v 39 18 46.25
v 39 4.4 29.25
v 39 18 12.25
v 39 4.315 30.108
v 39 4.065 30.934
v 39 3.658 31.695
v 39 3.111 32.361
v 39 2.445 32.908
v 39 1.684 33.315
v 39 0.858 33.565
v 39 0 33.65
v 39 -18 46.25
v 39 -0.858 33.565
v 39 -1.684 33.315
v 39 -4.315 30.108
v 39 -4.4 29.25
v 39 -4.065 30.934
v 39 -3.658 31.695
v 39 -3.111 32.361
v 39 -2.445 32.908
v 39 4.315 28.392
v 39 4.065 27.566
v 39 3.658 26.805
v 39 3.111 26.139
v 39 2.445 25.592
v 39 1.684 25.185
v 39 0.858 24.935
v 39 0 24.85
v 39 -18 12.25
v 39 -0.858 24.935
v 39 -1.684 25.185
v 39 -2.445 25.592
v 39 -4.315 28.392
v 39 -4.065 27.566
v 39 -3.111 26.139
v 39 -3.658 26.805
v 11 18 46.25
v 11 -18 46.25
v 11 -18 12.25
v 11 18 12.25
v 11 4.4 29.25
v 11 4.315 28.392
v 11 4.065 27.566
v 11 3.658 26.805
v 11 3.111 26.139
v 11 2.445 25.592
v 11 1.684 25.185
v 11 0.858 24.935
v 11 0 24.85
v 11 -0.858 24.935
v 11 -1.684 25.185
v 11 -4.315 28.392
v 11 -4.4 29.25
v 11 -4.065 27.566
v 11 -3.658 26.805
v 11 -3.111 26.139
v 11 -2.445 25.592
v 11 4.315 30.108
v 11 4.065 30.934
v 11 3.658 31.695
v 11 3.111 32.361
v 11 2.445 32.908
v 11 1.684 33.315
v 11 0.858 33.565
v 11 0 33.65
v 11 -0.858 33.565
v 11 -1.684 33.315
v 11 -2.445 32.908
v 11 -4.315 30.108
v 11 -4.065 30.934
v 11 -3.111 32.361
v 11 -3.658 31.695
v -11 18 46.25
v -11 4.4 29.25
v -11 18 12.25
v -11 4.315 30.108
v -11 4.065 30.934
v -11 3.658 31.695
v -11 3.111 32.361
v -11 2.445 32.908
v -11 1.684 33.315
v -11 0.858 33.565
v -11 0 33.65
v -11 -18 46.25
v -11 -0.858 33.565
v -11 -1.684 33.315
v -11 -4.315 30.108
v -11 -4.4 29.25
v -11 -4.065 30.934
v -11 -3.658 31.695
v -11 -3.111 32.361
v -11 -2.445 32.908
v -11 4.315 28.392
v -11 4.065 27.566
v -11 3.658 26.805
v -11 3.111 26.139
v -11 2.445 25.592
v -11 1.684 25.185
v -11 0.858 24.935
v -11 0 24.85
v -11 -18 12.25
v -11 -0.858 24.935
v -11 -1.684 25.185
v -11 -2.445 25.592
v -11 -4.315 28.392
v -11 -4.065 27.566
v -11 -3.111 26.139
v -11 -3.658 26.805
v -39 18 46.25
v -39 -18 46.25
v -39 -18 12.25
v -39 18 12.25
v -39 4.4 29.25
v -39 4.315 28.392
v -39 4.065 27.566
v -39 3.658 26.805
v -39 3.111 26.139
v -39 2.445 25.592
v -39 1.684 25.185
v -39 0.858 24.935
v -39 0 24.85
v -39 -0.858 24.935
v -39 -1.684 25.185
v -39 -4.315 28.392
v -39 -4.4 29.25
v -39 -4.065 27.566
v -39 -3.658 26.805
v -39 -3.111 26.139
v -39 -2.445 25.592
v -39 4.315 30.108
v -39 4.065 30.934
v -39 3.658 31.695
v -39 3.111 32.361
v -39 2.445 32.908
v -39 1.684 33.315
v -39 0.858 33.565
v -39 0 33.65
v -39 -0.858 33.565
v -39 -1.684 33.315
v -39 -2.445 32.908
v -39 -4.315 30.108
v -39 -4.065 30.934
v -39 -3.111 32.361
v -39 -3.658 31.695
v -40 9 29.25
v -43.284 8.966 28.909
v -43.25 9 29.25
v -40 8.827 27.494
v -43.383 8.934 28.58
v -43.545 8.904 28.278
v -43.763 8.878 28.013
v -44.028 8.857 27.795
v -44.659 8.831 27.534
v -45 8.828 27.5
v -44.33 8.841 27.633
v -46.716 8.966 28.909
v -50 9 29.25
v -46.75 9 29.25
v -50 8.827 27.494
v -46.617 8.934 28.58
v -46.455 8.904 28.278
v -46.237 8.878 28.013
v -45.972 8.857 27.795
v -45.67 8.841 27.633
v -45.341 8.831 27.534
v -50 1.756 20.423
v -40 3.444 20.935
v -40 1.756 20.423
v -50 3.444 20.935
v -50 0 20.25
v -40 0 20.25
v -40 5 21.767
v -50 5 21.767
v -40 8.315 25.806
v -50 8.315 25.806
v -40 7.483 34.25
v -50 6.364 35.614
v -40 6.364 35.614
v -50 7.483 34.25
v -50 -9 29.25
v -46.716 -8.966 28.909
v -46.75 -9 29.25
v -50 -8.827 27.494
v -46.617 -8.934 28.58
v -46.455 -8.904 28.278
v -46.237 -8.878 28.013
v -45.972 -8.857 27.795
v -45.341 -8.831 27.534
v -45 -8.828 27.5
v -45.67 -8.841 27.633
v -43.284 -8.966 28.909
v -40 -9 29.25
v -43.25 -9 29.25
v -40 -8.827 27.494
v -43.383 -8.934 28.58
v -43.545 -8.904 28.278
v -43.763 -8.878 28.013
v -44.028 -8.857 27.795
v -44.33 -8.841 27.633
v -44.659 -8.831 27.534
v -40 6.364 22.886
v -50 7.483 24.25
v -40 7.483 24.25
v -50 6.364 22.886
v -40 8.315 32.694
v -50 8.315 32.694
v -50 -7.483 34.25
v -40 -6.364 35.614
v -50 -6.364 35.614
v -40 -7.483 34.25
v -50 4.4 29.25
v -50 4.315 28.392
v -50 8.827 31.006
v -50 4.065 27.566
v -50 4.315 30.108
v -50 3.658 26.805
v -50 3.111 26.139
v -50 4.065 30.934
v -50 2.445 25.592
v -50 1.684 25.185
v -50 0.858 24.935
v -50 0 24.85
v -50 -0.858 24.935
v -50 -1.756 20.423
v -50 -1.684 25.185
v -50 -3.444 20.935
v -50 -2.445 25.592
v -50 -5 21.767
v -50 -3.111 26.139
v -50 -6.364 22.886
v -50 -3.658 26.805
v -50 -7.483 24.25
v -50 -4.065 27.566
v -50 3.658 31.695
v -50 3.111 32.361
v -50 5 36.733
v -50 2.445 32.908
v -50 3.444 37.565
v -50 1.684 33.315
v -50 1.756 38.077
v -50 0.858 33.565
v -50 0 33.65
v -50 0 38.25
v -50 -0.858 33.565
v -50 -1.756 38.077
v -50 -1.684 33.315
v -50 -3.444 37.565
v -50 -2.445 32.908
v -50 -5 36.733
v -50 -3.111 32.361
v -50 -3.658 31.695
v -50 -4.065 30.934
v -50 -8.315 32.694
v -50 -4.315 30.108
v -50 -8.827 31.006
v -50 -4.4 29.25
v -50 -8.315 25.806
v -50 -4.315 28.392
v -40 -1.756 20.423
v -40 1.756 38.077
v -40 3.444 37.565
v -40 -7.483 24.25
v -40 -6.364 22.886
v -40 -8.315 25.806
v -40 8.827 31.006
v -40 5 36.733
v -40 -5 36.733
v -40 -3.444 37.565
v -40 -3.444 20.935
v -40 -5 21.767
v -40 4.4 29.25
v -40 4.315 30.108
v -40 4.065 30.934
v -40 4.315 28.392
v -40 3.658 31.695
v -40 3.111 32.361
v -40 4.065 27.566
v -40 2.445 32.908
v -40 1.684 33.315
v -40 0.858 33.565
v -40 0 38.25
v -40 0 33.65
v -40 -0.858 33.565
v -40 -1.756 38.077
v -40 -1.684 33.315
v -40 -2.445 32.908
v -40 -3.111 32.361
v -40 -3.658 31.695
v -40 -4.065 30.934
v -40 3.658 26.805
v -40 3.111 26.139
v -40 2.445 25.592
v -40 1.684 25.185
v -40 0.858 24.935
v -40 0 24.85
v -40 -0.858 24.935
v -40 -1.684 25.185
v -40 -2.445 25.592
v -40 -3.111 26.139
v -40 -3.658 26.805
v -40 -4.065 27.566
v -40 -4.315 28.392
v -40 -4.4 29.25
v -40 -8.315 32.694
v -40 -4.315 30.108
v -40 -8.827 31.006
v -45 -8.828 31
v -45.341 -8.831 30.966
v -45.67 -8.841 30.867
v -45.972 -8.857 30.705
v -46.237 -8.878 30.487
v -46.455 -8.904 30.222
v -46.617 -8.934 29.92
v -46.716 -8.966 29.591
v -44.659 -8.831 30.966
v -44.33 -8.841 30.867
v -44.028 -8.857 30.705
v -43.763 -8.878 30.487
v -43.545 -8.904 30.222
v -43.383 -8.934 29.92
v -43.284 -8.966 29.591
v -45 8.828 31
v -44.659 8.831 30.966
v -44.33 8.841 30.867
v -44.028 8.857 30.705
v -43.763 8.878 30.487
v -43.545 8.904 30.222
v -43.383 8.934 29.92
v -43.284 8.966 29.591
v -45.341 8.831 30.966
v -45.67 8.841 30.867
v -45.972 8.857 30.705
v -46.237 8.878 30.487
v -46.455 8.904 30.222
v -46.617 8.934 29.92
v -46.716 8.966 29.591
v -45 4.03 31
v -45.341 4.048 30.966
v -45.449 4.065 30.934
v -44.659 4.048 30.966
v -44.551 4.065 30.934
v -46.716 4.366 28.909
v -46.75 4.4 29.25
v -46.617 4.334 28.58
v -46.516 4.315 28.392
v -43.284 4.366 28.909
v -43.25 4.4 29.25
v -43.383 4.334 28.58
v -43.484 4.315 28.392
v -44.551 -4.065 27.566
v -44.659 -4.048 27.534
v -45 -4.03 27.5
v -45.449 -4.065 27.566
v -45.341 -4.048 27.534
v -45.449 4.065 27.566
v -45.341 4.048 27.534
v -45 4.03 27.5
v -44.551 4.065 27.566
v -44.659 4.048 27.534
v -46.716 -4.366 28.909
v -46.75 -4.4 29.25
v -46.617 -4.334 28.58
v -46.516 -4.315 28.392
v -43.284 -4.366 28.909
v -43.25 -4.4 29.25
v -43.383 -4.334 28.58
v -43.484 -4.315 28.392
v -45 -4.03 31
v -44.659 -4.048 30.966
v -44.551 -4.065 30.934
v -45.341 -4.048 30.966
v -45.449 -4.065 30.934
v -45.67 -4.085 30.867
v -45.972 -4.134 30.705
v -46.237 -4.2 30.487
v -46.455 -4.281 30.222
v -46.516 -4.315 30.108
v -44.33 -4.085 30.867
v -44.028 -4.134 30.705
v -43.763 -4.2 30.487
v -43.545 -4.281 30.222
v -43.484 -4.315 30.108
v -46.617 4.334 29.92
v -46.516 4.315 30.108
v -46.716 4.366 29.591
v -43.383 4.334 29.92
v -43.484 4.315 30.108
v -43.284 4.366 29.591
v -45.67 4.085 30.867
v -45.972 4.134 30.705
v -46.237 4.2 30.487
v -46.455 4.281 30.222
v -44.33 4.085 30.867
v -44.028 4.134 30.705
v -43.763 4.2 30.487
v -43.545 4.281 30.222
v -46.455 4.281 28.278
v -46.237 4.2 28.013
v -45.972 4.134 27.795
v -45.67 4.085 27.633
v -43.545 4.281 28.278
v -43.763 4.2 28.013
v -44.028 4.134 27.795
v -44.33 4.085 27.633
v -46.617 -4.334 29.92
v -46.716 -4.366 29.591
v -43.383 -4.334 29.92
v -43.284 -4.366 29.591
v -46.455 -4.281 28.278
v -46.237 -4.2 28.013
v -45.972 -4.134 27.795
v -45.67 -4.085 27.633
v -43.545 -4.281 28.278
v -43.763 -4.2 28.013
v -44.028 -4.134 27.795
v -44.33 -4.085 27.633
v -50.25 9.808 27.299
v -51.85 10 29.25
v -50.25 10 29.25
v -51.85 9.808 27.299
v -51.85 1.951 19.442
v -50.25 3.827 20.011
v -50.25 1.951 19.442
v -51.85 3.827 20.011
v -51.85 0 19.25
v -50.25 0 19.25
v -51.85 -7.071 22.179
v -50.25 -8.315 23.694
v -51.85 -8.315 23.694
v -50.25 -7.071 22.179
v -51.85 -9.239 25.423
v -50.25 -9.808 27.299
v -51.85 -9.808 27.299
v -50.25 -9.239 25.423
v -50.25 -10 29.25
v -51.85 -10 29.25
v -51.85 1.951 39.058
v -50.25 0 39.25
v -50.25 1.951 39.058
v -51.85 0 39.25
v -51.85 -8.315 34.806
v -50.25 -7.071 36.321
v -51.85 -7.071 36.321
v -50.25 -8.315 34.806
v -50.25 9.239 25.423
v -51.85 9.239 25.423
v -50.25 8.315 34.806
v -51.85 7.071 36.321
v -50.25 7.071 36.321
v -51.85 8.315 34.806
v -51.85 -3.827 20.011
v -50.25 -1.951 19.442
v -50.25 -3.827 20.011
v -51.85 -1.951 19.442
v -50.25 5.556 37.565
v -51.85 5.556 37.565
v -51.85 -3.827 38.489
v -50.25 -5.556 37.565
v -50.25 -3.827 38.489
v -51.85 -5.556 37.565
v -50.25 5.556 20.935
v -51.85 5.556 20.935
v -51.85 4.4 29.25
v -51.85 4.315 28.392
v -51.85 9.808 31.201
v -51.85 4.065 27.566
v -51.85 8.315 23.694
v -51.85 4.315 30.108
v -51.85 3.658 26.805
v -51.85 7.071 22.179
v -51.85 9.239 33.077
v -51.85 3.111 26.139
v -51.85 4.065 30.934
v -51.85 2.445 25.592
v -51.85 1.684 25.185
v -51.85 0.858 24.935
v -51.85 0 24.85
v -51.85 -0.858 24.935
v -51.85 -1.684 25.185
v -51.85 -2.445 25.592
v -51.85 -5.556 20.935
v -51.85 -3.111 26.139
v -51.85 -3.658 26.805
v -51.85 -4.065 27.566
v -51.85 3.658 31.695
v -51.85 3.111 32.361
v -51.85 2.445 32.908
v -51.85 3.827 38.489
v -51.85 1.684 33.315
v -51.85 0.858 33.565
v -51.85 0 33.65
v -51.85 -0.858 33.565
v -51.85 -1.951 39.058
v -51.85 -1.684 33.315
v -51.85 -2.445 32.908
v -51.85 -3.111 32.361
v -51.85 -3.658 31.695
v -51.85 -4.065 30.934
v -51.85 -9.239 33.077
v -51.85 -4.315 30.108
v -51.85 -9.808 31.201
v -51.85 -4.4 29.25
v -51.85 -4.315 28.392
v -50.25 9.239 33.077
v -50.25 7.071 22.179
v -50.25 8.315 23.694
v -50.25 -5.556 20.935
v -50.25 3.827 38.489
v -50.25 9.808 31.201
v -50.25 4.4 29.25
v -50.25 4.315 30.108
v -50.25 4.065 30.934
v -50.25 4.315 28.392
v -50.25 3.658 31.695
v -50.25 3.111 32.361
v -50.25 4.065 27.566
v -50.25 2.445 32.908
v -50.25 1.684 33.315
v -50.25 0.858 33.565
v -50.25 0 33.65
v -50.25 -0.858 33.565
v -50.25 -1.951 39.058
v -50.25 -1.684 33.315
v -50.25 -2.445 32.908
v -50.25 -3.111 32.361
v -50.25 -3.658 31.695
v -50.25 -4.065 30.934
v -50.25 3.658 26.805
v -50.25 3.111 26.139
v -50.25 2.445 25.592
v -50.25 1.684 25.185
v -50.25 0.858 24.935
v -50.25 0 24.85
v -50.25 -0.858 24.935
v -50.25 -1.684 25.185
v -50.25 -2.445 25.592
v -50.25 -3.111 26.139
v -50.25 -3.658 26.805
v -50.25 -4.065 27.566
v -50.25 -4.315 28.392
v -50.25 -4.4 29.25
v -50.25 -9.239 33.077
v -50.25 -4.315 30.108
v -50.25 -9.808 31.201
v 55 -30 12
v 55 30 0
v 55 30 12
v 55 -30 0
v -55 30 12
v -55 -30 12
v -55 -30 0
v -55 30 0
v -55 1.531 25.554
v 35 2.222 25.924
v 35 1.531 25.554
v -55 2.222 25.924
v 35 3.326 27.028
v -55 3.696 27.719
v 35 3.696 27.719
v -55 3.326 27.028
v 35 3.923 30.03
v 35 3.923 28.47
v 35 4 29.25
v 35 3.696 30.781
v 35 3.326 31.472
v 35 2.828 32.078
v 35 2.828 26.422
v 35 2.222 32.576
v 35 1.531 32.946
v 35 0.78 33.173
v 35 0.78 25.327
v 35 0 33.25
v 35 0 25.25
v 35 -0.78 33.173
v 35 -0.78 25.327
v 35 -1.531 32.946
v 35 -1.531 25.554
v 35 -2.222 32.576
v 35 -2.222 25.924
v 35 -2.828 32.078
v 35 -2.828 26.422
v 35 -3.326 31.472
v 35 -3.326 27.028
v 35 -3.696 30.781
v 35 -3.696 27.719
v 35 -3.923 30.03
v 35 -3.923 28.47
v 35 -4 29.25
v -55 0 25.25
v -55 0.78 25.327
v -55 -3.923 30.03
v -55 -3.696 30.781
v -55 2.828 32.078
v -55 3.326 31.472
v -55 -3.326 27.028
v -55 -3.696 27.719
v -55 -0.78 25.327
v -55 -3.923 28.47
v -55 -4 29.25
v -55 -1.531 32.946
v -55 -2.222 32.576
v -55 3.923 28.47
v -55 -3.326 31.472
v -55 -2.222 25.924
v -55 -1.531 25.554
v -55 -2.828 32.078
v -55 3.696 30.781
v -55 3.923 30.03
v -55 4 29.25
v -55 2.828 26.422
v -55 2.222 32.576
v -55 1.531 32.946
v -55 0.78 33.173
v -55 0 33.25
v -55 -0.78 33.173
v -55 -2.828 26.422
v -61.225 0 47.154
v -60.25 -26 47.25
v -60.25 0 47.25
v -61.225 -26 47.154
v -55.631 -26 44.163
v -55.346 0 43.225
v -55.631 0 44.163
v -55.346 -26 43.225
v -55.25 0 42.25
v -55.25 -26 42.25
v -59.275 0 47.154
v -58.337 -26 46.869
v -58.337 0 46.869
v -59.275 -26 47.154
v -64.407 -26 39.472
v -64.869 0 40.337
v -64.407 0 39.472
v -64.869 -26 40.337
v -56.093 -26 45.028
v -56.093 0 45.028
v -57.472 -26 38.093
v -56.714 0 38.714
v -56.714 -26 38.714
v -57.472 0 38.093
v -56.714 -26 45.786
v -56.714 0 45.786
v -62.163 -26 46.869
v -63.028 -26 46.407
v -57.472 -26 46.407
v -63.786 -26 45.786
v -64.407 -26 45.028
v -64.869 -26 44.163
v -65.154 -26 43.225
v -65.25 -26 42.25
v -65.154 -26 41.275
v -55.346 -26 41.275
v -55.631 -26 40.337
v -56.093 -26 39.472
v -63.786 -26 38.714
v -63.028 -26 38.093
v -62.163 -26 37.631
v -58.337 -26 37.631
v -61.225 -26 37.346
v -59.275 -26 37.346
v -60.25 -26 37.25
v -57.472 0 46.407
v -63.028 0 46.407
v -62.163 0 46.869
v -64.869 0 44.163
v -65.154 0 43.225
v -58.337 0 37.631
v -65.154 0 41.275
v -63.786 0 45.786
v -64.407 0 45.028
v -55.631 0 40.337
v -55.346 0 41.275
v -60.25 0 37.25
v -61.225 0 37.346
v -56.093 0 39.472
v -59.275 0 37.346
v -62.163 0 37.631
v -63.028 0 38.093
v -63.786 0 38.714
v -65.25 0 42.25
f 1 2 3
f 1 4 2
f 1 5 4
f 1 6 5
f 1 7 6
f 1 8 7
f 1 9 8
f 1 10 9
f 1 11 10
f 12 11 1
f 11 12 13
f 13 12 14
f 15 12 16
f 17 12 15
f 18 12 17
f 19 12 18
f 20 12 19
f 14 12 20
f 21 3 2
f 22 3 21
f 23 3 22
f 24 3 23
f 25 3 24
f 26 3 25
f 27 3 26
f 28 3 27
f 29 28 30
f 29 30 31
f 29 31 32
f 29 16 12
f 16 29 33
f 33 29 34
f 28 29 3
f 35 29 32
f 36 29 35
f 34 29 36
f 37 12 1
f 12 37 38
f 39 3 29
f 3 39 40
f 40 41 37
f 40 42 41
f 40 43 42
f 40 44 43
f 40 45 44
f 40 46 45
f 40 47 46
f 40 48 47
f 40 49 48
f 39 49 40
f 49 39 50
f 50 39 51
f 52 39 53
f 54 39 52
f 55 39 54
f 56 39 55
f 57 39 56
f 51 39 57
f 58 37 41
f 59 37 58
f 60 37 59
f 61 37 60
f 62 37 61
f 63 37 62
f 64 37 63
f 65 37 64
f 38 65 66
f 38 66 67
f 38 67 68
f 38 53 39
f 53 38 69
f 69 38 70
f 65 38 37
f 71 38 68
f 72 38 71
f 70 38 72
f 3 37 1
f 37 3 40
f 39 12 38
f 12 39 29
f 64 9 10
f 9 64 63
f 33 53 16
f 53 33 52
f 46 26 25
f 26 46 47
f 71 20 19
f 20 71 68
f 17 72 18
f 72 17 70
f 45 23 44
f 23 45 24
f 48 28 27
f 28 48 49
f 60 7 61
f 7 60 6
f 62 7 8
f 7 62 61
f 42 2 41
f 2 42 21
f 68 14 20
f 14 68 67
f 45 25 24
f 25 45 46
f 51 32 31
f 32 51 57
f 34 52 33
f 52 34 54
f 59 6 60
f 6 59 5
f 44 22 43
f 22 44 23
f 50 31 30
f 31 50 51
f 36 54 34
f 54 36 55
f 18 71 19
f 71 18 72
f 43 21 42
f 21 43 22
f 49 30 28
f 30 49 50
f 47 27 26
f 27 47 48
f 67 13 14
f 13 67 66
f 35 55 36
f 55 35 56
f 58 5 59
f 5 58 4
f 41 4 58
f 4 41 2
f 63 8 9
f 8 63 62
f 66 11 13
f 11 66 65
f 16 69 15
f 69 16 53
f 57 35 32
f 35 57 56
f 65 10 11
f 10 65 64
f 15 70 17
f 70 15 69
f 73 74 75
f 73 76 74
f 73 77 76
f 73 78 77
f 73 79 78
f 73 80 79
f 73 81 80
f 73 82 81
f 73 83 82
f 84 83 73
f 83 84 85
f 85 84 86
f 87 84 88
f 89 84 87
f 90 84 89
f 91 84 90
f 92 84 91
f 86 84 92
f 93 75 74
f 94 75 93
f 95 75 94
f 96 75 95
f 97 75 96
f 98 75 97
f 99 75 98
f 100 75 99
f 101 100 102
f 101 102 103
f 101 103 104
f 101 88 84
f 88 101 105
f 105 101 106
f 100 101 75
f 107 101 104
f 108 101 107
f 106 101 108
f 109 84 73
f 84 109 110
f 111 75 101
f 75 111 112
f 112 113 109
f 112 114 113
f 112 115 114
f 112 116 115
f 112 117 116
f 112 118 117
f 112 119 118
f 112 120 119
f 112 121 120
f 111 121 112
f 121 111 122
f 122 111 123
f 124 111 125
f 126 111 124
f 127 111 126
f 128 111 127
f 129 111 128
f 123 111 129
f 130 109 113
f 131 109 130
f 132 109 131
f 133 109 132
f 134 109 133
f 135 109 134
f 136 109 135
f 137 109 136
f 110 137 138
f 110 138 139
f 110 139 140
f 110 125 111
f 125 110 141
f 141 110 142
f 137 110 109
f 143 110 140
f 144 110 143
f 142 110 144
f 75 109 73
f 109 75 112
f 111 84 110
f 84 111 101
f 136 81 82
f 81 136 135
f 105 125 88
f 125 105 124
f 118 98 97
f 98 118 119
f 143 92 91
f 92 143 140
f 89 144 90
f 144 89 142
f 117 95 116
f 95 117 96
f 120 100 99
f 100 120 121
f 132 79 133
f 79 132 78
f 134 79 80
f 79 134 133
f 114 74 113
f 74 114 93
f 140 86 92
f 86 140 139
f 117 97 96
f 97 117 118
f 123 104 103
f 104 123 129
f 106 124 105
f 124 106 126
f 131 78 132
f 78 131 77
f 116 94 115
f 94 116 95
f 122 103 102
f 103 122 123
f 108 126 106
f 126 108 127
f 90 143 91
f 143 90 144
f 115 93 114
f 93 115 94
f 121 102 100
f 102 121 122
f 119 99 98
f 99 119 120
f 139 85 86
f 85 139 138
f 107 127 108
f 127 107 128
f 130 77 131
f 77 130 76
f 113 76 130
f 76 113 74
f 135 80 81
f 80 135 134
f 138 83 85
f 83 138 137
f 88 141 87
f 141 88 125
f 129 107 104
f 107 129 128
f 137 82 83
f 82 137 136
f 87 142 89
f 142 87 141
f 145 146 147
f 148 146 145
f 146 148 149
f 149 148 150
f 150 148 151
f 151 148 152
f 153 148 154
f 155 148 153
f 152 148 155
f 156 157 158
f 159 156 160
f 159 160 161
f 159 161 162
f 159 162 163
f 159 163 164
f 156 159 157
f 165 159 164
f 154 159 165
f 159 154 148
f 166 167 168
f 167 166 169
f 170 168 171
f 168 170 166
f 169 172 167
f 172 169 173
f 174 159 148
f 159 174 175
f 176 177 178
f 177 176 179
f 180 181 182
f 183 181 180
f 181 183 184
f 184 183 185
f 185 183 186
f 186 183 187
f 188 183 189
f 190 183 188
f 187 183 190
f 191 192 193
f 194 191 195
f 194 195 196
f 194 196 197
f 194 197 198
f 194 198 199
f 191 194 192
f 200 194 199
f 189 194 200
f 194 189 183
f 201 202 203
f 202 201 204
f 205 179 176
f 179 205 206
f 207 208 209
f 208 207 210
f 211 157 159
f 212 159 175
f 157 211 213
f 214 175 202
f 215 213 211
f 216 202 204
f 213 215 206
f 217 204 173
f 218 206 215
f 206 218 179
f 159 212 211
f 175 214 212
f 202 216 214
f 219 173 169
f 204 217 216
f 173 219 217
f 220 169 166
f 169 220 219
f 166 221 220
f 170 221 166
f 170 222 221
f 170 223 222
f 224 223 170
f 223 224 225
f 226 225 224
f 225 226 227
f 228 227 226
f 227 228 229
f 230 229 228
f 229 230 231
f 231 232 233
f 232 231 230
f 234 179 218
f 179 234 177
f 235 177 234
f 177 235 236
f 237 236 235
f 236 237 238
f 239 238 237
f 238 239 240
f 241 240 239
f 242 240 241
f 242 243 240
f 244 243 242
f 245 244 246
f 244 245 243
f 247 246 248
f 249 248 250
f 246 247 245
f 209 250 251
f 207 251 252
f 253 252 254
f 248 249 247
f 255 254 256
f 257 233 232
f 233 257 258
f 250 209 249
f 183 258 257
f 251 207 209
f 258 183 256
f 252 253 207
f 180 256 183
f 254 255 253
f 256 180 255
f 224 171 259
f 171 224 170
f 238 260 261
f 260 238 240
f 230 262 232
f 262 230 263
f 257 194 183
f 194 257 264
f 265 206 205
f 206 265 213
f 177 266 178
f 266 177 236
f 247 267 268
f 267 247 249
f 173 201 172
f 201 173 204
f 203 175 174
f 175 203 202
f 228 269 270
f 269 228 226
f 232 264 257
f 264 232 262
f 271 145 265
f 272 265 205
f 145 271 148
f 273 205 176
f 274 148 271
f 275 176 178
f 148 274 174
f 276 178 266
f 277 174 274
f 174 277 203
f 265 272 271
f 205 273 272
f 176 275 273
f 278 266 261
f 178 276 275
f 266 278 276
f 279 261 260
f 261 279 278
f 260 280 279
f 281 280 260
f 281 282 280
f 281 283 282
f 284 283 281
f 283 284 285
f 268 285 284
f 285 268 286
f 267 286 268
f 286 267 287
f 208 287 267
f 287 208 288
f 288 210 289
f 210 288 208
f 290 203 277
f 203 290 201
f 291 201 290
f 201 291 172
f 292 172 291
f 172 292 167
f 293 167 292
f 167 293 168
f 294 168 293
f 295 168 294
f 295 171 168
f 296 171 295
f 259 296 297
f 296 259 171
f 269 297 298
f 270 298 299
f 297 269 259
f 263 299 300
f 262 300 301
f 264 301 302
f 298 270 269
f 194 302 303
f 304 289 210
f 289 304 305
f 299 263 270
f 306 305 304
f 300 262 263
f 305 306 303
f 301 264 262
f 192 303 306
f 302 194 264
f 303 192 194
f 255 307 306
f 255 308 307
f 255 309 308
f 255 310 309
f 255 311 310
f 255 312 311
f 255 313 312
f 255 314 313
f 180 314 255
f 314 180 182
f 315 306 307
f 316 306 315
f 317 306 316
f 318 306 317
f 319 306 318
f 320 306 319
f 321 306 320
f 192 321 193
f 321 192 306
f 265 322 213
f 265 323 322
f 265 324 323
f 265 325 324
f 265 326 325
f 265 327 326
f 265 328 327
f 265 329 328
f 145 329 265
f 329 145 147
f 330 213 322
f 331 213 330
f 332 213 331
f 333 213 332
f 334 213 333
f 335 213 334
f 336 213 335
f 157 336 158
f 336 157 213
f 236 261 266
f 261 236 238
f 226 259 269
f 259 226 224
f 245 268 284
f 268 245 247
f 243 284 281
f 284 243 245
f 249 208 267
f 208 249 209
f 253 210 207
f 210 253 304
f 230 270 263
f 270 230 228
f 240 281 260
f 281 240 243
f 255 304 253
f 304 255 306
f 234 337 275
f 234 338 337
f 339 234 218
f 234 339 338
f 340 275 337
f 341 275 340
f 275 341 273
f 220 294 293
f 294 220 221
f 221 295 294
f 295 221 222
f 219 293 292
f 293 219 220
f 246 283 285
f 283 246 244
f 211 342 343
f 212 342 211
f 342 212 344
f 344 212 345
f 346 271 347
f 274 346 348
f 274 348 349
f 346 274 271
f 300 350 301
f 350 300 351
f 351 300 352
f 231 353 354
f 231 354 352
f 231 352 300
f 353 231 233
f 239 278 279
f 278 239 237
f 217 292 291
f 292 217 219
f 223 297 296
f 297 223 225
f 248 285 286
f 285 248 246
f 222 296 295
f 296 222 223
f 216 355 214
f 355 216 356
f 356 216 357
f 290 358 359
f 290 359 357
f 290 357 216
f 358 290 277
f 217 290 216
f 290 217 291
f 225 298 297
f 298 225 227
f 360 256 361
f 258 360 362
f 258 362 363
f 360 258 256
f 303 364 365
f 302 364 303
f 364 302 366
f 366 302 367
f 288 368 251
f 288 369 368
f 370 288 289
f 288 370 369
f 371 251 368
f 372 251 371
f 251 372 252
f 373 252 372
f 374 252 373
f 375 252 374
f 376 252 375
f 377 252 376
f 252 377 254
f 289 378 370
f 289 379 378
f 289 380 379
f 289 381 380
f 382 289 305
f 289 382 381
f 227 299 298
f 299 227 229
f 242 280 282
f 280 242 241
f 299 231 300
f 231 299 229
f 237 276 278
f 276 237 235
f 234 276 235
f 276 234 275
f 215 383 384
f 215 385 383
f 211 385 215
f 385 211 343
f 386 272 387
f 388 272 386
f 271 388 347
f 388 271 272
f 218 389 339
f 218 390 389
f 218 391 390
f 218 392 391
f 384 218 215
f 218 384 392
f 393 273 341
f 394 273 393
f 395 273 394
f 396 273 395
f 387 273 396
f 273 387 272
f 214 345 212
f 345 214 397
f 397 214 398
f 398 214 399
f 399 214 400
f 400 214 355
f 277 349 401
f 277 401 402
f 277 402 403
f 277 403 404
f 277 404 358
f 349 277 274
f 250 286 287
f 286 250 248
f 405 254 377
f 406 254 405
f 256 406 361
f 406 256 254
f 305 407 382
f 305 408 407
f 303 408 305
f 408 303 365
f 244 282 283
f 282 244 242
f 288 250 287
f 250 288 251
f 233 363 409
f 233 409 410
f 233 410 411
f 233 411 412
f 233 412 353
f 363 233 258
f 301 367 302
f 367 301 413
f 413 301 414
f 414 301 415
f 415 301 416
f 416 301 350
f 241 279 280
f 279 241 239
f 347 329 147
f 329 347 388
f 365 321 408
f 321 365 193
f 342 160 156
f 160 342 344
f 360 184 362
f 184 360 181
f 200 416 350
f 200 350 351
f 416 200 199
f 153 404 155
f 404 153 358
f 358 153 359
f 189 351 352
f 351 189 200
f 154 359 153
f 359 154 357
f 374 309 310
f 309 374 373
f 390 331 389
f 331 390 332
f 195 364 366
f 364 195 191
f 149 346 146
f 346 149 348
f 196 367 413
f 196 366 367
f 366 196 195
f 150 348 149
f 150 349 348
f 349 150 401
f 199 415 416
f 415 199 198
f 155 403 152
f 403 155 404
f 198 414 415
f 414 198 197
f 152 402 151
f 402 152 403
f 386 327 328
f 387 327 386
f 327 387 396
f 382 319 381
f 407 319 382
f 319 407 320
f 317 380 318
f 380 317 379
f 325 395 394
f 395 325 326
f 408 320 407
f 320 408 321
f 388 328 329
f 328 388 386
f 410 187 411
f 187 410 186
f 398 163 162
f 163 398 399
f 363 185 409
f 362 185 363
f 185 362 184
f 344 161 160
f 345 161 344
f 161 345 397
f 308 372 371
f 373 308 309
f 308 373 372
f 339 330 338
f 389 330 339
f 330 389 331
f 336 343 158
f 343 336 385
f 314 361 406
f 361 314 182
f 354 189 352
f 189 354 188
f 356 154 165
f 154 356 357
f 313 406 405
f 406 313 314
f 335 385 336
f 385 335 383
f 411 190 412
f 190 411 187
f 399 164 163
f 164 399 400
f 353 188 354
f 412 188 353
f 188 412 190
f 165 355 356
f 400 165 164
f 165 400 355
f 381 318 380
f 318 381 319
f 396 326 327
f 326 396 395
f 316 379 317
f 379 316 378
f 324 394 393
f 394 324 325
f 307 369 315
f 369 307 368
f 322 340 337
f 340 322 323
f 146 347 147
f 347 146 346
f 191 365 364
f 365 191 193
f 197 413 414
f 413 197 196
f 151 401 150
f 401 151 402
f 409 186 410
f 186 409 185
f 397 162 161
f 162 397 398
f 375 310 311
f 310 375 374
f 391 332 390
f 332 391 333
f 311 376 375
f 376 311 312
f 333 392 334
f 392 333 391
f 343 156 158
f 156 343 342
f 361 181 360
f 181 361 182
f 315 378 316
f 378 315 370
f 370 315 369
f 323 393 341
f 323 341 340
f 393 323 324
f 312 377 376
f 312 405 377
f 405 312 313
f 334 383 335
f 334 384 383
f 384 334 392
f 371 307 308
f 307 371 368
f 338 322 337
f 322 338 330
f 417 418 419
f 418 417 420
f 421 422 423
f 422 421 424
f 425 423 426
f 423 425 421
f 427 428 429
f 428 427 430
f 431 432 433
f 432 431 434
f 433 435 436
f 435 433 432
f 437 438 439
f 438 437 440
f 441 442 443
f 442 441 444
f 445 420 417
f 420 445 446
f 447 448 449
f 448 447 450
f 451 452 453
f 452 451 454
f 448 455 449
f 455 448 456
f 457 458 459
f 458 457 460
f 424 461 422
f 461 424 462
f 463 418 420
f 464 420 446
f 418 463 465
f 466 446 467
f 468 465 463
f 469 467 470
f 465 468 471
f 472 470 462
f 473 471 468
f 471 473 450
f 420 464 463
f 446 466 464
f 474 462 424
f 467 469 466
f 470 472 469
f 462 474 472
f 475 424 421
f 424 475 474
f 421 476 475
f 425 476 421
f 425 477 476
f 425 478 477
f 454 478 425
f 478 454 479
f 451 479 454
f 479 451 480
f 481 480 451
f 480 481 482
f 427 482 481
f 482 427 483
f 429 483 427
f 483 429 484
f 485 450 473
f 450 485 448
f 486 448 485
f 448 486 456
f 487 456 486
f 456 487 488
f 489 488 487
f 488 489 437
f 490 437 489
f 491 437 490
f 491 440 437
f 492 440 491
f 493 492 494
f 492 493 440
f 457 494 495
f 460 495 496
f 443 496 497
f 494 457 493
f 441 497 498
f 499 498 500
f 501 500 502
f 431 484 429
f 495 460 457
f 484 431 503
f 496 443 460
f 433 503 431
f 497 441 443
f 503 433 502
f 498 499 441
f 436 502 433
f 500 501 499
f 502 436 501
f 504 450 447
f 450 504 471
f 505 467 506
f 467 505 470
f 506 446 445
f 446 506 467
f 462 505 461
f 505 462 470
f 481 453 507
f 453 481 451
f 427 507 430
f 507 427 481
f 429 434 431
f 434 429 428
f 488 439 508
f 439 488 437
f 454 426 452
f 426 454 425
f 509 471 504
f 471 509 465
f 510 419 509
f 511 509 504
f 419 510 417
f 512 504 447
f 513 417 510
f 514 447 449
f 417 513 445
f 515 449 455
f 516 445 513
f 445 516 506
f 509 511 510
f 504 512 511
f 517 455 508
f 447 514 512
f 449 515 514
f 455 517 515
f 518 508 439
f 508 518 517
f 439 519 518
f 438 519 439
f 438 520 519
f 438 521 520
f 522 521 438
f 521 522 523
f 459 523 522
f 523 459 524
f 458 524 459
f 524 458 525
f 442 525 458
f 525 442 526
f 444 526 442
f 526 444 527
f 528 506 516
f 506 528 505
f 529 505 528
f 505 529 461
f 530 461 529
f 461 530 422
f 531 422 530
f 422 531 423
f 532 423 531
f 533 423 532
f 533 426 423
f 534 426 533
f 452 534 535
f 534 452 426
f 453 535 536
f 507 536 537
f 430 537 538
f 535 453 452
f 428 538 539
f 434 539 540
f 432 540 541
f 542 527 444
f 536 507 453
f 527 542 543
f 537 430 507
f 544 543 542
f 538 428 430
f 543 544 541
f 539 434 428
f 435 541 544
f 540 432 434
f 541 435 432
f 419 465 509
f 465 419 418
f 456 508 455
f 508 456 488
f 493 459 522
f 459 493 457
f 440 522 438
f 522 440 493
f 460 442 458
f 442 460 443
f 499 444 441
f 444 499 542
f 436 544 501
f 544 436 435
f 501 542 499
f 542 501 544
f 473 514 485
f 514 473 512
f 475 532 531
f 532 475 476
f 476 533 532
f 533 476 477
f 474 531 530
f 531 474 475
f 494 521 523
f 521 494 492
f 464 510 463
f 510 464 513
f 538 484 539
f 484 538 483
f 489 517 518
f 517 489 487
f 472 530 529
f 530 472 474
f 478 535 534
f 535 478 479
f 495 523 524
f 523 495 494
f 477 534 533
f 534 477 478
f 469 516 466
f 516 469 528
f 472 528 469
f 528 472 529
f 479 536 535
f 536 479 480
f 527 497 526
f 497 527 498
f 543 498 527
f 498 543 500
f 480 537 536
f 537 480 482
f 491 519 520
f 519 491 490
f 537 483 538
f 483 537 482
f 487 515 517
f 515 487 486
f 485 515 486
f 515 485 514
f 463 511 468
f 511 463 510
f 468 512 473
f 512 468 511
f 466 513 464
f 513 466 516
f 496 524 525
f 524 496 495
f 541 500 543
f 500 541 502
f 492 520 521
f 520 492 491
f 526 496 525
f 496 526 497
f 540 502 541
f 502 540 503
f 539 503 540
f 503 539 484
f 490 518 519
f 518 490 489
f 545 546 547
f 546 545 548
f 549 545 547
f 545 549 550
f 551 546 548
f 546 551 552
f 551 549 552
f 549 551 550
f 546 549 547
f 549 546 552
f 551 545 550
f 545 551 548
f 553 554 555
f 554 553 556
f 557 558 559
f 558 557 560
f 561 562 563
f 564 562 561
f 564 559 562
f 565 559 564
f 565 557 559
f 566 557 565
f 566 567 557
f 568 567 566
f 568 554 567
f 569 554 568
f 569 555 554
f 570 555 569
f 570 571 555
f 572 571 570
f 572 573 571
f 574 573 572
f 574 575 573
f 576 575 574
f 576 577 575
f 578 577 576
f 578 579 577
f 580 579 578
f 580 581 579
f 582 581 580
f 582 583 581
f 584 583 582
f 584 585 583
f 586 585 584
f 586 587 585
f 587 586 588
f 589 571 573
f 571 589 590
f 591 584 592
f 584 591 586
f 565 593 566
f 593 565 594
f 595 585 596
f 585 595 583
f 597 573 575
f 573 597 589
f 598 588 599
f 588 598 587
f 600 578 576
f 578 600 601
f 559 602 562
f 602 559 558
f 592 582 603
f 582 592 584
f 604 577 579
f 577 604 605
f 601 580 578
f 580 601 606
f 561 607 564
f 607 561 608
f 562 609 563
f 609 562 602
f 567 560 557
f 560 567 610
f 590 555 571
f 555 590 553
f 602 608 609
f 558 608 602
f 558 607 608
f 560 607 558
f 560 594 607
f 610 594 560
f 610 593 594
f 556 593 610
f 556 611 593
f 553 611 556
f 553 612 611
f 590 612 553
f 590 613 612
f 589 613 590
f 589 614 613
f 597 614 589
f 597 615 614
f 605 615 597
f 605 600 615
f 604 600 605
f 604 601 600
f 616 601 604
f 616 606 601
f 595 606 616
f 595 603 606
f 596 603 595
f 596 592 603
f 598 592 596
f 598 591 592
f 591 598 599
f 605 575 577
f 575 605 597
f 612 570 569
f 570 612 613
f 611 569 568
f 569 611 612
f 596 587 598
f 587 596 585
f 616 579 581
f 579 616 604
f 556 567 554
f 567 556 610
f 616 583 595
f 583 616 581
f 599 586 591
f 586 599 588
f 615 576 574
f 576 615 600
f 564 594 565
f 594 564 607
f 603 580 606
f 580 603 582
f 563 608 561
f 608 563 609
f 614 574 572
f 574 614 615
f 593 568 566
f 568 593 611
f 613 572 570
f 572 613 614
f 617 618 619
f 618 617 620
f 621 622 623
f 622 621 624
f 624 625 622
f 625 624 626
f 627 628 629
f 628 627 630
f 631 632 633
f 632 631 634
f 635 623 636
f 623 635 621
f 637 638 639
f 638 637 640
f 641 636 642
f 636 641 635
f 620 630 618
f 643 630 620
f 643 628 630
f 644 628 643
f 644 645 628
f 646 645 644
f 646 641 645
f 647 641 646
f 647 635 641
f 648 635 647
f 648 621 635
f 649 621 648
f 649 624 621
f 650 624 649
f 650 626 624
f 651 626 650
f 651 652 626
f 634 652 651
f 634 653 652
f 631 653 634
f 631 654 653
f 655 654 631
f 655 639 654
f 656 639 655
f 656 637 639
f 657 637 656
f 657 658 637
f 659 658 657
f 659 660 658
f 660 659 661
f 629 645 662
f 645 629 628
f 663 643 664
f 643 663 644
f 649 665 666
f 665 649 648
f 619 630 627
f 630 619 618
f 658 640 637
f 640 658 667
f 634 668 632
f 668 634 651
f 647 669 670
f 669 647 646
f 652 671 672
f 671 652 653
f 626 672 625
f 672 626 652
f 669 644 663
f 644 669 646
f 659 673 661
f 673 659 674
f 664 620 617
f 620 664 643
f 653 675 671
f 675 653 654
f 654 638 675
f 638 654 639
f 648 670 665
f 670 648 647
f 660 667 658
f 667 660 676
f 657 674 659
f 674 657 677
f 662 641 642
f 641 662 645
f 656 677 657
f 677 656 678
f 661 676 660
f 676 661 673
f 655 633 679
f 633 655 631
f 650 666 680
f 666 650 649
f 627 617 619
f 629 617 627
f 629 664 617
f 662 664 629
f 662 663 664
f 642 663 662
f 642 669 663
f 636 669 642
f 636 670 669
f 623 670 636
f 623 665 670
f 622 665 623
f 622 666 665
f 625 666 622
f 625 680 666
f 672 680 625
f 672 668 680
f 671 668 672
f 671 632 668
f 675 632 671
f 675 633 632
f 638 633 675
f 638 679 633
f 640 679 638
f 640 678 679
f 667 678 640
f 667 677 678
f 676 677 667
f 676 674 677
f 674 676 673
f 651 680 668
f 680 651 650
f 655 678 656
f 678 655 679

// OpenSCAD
$fn = 32;

// ------------------------------------------------------------------------
// Machine vise: screw d8, jaws 28 x 34 mm
// Every part is its own module, assembly() places every instance.
// ------------------------------------------------------------------------

// --- part 1 ---
module vise_bed() {
  difference() {
    translate([-55, -30, 0]) cube([110, 60, 12]);
  }
}

// --- part 2 ---
module vise_jaw() {
  difference() {
    translate([-14, -18, 0]) cube([28, 36, 34]);
    translate([0, 0, 17]) rotate([0, 90, 0]) cylinder(h = 30, d = 8.8, center = true);
  }
}

// --- part 3 ---
module vise_screw() {
  translate([0, 0, -45]) cylinder(h = 90, d = 8);
}

// --- part 4 ---
module screw_collar() {
  difference() {
    cylinder(h = 10, d = 18);
    translate([0, 0, -1]) cylinder(h = 12, d = 8.8);
    translate([0, 0, 5]) rotate([90, 0, 0]) cylinder(h = 20, d = 3.5, center = true);
  }
}

// --- part 5 ---
module screw_washer() {
  difference() {
      translate([0, 0, 0]) cylinder(h = 1.6, d = 20);
      translate([0, 0, -1]) cylinder(h = 3.6, d = 8.8);
    }
}

// --- part 6 ---
module vise_handle() {
  cylinder(h = 26, d = 10);
}

// --- assembly ---
module assembly() {
  color([0.80, 0.24, 0.20]) translate([0, 0, 0]) rotate([0, 0, 0]) vise_bed();
  color([0.20, 0.45, 0.75]) translate([25, 0, 12.25]) rotate([0, 0, 0]) vise_jaw();
  color([0.25, 0.62, 0.32]) translate([-25, 0, 12.25]) rotate([0, 0, 0]) vise_jaw();
  color([0.92, 0.70, 0.18]) translate([-10, 0, 29.25]) rotate([0, 90, 0]) vise_screw();
  color([0.58, 0.35, 0.70]) translate([-50, 0, 29.25]) rotate([0, 90, 0]) screw_collar();
  color([0.16, 0.66, 0.66]) translate([-51.85, 0, 29.25]) rotate([0, 90, 0]) screw_washer();
  color([0.85, 0.48, 0.18]) translate([-60.25, 0, 42.25]) rotate([90, 0, 0]) vise_handle();
}

assembly();
